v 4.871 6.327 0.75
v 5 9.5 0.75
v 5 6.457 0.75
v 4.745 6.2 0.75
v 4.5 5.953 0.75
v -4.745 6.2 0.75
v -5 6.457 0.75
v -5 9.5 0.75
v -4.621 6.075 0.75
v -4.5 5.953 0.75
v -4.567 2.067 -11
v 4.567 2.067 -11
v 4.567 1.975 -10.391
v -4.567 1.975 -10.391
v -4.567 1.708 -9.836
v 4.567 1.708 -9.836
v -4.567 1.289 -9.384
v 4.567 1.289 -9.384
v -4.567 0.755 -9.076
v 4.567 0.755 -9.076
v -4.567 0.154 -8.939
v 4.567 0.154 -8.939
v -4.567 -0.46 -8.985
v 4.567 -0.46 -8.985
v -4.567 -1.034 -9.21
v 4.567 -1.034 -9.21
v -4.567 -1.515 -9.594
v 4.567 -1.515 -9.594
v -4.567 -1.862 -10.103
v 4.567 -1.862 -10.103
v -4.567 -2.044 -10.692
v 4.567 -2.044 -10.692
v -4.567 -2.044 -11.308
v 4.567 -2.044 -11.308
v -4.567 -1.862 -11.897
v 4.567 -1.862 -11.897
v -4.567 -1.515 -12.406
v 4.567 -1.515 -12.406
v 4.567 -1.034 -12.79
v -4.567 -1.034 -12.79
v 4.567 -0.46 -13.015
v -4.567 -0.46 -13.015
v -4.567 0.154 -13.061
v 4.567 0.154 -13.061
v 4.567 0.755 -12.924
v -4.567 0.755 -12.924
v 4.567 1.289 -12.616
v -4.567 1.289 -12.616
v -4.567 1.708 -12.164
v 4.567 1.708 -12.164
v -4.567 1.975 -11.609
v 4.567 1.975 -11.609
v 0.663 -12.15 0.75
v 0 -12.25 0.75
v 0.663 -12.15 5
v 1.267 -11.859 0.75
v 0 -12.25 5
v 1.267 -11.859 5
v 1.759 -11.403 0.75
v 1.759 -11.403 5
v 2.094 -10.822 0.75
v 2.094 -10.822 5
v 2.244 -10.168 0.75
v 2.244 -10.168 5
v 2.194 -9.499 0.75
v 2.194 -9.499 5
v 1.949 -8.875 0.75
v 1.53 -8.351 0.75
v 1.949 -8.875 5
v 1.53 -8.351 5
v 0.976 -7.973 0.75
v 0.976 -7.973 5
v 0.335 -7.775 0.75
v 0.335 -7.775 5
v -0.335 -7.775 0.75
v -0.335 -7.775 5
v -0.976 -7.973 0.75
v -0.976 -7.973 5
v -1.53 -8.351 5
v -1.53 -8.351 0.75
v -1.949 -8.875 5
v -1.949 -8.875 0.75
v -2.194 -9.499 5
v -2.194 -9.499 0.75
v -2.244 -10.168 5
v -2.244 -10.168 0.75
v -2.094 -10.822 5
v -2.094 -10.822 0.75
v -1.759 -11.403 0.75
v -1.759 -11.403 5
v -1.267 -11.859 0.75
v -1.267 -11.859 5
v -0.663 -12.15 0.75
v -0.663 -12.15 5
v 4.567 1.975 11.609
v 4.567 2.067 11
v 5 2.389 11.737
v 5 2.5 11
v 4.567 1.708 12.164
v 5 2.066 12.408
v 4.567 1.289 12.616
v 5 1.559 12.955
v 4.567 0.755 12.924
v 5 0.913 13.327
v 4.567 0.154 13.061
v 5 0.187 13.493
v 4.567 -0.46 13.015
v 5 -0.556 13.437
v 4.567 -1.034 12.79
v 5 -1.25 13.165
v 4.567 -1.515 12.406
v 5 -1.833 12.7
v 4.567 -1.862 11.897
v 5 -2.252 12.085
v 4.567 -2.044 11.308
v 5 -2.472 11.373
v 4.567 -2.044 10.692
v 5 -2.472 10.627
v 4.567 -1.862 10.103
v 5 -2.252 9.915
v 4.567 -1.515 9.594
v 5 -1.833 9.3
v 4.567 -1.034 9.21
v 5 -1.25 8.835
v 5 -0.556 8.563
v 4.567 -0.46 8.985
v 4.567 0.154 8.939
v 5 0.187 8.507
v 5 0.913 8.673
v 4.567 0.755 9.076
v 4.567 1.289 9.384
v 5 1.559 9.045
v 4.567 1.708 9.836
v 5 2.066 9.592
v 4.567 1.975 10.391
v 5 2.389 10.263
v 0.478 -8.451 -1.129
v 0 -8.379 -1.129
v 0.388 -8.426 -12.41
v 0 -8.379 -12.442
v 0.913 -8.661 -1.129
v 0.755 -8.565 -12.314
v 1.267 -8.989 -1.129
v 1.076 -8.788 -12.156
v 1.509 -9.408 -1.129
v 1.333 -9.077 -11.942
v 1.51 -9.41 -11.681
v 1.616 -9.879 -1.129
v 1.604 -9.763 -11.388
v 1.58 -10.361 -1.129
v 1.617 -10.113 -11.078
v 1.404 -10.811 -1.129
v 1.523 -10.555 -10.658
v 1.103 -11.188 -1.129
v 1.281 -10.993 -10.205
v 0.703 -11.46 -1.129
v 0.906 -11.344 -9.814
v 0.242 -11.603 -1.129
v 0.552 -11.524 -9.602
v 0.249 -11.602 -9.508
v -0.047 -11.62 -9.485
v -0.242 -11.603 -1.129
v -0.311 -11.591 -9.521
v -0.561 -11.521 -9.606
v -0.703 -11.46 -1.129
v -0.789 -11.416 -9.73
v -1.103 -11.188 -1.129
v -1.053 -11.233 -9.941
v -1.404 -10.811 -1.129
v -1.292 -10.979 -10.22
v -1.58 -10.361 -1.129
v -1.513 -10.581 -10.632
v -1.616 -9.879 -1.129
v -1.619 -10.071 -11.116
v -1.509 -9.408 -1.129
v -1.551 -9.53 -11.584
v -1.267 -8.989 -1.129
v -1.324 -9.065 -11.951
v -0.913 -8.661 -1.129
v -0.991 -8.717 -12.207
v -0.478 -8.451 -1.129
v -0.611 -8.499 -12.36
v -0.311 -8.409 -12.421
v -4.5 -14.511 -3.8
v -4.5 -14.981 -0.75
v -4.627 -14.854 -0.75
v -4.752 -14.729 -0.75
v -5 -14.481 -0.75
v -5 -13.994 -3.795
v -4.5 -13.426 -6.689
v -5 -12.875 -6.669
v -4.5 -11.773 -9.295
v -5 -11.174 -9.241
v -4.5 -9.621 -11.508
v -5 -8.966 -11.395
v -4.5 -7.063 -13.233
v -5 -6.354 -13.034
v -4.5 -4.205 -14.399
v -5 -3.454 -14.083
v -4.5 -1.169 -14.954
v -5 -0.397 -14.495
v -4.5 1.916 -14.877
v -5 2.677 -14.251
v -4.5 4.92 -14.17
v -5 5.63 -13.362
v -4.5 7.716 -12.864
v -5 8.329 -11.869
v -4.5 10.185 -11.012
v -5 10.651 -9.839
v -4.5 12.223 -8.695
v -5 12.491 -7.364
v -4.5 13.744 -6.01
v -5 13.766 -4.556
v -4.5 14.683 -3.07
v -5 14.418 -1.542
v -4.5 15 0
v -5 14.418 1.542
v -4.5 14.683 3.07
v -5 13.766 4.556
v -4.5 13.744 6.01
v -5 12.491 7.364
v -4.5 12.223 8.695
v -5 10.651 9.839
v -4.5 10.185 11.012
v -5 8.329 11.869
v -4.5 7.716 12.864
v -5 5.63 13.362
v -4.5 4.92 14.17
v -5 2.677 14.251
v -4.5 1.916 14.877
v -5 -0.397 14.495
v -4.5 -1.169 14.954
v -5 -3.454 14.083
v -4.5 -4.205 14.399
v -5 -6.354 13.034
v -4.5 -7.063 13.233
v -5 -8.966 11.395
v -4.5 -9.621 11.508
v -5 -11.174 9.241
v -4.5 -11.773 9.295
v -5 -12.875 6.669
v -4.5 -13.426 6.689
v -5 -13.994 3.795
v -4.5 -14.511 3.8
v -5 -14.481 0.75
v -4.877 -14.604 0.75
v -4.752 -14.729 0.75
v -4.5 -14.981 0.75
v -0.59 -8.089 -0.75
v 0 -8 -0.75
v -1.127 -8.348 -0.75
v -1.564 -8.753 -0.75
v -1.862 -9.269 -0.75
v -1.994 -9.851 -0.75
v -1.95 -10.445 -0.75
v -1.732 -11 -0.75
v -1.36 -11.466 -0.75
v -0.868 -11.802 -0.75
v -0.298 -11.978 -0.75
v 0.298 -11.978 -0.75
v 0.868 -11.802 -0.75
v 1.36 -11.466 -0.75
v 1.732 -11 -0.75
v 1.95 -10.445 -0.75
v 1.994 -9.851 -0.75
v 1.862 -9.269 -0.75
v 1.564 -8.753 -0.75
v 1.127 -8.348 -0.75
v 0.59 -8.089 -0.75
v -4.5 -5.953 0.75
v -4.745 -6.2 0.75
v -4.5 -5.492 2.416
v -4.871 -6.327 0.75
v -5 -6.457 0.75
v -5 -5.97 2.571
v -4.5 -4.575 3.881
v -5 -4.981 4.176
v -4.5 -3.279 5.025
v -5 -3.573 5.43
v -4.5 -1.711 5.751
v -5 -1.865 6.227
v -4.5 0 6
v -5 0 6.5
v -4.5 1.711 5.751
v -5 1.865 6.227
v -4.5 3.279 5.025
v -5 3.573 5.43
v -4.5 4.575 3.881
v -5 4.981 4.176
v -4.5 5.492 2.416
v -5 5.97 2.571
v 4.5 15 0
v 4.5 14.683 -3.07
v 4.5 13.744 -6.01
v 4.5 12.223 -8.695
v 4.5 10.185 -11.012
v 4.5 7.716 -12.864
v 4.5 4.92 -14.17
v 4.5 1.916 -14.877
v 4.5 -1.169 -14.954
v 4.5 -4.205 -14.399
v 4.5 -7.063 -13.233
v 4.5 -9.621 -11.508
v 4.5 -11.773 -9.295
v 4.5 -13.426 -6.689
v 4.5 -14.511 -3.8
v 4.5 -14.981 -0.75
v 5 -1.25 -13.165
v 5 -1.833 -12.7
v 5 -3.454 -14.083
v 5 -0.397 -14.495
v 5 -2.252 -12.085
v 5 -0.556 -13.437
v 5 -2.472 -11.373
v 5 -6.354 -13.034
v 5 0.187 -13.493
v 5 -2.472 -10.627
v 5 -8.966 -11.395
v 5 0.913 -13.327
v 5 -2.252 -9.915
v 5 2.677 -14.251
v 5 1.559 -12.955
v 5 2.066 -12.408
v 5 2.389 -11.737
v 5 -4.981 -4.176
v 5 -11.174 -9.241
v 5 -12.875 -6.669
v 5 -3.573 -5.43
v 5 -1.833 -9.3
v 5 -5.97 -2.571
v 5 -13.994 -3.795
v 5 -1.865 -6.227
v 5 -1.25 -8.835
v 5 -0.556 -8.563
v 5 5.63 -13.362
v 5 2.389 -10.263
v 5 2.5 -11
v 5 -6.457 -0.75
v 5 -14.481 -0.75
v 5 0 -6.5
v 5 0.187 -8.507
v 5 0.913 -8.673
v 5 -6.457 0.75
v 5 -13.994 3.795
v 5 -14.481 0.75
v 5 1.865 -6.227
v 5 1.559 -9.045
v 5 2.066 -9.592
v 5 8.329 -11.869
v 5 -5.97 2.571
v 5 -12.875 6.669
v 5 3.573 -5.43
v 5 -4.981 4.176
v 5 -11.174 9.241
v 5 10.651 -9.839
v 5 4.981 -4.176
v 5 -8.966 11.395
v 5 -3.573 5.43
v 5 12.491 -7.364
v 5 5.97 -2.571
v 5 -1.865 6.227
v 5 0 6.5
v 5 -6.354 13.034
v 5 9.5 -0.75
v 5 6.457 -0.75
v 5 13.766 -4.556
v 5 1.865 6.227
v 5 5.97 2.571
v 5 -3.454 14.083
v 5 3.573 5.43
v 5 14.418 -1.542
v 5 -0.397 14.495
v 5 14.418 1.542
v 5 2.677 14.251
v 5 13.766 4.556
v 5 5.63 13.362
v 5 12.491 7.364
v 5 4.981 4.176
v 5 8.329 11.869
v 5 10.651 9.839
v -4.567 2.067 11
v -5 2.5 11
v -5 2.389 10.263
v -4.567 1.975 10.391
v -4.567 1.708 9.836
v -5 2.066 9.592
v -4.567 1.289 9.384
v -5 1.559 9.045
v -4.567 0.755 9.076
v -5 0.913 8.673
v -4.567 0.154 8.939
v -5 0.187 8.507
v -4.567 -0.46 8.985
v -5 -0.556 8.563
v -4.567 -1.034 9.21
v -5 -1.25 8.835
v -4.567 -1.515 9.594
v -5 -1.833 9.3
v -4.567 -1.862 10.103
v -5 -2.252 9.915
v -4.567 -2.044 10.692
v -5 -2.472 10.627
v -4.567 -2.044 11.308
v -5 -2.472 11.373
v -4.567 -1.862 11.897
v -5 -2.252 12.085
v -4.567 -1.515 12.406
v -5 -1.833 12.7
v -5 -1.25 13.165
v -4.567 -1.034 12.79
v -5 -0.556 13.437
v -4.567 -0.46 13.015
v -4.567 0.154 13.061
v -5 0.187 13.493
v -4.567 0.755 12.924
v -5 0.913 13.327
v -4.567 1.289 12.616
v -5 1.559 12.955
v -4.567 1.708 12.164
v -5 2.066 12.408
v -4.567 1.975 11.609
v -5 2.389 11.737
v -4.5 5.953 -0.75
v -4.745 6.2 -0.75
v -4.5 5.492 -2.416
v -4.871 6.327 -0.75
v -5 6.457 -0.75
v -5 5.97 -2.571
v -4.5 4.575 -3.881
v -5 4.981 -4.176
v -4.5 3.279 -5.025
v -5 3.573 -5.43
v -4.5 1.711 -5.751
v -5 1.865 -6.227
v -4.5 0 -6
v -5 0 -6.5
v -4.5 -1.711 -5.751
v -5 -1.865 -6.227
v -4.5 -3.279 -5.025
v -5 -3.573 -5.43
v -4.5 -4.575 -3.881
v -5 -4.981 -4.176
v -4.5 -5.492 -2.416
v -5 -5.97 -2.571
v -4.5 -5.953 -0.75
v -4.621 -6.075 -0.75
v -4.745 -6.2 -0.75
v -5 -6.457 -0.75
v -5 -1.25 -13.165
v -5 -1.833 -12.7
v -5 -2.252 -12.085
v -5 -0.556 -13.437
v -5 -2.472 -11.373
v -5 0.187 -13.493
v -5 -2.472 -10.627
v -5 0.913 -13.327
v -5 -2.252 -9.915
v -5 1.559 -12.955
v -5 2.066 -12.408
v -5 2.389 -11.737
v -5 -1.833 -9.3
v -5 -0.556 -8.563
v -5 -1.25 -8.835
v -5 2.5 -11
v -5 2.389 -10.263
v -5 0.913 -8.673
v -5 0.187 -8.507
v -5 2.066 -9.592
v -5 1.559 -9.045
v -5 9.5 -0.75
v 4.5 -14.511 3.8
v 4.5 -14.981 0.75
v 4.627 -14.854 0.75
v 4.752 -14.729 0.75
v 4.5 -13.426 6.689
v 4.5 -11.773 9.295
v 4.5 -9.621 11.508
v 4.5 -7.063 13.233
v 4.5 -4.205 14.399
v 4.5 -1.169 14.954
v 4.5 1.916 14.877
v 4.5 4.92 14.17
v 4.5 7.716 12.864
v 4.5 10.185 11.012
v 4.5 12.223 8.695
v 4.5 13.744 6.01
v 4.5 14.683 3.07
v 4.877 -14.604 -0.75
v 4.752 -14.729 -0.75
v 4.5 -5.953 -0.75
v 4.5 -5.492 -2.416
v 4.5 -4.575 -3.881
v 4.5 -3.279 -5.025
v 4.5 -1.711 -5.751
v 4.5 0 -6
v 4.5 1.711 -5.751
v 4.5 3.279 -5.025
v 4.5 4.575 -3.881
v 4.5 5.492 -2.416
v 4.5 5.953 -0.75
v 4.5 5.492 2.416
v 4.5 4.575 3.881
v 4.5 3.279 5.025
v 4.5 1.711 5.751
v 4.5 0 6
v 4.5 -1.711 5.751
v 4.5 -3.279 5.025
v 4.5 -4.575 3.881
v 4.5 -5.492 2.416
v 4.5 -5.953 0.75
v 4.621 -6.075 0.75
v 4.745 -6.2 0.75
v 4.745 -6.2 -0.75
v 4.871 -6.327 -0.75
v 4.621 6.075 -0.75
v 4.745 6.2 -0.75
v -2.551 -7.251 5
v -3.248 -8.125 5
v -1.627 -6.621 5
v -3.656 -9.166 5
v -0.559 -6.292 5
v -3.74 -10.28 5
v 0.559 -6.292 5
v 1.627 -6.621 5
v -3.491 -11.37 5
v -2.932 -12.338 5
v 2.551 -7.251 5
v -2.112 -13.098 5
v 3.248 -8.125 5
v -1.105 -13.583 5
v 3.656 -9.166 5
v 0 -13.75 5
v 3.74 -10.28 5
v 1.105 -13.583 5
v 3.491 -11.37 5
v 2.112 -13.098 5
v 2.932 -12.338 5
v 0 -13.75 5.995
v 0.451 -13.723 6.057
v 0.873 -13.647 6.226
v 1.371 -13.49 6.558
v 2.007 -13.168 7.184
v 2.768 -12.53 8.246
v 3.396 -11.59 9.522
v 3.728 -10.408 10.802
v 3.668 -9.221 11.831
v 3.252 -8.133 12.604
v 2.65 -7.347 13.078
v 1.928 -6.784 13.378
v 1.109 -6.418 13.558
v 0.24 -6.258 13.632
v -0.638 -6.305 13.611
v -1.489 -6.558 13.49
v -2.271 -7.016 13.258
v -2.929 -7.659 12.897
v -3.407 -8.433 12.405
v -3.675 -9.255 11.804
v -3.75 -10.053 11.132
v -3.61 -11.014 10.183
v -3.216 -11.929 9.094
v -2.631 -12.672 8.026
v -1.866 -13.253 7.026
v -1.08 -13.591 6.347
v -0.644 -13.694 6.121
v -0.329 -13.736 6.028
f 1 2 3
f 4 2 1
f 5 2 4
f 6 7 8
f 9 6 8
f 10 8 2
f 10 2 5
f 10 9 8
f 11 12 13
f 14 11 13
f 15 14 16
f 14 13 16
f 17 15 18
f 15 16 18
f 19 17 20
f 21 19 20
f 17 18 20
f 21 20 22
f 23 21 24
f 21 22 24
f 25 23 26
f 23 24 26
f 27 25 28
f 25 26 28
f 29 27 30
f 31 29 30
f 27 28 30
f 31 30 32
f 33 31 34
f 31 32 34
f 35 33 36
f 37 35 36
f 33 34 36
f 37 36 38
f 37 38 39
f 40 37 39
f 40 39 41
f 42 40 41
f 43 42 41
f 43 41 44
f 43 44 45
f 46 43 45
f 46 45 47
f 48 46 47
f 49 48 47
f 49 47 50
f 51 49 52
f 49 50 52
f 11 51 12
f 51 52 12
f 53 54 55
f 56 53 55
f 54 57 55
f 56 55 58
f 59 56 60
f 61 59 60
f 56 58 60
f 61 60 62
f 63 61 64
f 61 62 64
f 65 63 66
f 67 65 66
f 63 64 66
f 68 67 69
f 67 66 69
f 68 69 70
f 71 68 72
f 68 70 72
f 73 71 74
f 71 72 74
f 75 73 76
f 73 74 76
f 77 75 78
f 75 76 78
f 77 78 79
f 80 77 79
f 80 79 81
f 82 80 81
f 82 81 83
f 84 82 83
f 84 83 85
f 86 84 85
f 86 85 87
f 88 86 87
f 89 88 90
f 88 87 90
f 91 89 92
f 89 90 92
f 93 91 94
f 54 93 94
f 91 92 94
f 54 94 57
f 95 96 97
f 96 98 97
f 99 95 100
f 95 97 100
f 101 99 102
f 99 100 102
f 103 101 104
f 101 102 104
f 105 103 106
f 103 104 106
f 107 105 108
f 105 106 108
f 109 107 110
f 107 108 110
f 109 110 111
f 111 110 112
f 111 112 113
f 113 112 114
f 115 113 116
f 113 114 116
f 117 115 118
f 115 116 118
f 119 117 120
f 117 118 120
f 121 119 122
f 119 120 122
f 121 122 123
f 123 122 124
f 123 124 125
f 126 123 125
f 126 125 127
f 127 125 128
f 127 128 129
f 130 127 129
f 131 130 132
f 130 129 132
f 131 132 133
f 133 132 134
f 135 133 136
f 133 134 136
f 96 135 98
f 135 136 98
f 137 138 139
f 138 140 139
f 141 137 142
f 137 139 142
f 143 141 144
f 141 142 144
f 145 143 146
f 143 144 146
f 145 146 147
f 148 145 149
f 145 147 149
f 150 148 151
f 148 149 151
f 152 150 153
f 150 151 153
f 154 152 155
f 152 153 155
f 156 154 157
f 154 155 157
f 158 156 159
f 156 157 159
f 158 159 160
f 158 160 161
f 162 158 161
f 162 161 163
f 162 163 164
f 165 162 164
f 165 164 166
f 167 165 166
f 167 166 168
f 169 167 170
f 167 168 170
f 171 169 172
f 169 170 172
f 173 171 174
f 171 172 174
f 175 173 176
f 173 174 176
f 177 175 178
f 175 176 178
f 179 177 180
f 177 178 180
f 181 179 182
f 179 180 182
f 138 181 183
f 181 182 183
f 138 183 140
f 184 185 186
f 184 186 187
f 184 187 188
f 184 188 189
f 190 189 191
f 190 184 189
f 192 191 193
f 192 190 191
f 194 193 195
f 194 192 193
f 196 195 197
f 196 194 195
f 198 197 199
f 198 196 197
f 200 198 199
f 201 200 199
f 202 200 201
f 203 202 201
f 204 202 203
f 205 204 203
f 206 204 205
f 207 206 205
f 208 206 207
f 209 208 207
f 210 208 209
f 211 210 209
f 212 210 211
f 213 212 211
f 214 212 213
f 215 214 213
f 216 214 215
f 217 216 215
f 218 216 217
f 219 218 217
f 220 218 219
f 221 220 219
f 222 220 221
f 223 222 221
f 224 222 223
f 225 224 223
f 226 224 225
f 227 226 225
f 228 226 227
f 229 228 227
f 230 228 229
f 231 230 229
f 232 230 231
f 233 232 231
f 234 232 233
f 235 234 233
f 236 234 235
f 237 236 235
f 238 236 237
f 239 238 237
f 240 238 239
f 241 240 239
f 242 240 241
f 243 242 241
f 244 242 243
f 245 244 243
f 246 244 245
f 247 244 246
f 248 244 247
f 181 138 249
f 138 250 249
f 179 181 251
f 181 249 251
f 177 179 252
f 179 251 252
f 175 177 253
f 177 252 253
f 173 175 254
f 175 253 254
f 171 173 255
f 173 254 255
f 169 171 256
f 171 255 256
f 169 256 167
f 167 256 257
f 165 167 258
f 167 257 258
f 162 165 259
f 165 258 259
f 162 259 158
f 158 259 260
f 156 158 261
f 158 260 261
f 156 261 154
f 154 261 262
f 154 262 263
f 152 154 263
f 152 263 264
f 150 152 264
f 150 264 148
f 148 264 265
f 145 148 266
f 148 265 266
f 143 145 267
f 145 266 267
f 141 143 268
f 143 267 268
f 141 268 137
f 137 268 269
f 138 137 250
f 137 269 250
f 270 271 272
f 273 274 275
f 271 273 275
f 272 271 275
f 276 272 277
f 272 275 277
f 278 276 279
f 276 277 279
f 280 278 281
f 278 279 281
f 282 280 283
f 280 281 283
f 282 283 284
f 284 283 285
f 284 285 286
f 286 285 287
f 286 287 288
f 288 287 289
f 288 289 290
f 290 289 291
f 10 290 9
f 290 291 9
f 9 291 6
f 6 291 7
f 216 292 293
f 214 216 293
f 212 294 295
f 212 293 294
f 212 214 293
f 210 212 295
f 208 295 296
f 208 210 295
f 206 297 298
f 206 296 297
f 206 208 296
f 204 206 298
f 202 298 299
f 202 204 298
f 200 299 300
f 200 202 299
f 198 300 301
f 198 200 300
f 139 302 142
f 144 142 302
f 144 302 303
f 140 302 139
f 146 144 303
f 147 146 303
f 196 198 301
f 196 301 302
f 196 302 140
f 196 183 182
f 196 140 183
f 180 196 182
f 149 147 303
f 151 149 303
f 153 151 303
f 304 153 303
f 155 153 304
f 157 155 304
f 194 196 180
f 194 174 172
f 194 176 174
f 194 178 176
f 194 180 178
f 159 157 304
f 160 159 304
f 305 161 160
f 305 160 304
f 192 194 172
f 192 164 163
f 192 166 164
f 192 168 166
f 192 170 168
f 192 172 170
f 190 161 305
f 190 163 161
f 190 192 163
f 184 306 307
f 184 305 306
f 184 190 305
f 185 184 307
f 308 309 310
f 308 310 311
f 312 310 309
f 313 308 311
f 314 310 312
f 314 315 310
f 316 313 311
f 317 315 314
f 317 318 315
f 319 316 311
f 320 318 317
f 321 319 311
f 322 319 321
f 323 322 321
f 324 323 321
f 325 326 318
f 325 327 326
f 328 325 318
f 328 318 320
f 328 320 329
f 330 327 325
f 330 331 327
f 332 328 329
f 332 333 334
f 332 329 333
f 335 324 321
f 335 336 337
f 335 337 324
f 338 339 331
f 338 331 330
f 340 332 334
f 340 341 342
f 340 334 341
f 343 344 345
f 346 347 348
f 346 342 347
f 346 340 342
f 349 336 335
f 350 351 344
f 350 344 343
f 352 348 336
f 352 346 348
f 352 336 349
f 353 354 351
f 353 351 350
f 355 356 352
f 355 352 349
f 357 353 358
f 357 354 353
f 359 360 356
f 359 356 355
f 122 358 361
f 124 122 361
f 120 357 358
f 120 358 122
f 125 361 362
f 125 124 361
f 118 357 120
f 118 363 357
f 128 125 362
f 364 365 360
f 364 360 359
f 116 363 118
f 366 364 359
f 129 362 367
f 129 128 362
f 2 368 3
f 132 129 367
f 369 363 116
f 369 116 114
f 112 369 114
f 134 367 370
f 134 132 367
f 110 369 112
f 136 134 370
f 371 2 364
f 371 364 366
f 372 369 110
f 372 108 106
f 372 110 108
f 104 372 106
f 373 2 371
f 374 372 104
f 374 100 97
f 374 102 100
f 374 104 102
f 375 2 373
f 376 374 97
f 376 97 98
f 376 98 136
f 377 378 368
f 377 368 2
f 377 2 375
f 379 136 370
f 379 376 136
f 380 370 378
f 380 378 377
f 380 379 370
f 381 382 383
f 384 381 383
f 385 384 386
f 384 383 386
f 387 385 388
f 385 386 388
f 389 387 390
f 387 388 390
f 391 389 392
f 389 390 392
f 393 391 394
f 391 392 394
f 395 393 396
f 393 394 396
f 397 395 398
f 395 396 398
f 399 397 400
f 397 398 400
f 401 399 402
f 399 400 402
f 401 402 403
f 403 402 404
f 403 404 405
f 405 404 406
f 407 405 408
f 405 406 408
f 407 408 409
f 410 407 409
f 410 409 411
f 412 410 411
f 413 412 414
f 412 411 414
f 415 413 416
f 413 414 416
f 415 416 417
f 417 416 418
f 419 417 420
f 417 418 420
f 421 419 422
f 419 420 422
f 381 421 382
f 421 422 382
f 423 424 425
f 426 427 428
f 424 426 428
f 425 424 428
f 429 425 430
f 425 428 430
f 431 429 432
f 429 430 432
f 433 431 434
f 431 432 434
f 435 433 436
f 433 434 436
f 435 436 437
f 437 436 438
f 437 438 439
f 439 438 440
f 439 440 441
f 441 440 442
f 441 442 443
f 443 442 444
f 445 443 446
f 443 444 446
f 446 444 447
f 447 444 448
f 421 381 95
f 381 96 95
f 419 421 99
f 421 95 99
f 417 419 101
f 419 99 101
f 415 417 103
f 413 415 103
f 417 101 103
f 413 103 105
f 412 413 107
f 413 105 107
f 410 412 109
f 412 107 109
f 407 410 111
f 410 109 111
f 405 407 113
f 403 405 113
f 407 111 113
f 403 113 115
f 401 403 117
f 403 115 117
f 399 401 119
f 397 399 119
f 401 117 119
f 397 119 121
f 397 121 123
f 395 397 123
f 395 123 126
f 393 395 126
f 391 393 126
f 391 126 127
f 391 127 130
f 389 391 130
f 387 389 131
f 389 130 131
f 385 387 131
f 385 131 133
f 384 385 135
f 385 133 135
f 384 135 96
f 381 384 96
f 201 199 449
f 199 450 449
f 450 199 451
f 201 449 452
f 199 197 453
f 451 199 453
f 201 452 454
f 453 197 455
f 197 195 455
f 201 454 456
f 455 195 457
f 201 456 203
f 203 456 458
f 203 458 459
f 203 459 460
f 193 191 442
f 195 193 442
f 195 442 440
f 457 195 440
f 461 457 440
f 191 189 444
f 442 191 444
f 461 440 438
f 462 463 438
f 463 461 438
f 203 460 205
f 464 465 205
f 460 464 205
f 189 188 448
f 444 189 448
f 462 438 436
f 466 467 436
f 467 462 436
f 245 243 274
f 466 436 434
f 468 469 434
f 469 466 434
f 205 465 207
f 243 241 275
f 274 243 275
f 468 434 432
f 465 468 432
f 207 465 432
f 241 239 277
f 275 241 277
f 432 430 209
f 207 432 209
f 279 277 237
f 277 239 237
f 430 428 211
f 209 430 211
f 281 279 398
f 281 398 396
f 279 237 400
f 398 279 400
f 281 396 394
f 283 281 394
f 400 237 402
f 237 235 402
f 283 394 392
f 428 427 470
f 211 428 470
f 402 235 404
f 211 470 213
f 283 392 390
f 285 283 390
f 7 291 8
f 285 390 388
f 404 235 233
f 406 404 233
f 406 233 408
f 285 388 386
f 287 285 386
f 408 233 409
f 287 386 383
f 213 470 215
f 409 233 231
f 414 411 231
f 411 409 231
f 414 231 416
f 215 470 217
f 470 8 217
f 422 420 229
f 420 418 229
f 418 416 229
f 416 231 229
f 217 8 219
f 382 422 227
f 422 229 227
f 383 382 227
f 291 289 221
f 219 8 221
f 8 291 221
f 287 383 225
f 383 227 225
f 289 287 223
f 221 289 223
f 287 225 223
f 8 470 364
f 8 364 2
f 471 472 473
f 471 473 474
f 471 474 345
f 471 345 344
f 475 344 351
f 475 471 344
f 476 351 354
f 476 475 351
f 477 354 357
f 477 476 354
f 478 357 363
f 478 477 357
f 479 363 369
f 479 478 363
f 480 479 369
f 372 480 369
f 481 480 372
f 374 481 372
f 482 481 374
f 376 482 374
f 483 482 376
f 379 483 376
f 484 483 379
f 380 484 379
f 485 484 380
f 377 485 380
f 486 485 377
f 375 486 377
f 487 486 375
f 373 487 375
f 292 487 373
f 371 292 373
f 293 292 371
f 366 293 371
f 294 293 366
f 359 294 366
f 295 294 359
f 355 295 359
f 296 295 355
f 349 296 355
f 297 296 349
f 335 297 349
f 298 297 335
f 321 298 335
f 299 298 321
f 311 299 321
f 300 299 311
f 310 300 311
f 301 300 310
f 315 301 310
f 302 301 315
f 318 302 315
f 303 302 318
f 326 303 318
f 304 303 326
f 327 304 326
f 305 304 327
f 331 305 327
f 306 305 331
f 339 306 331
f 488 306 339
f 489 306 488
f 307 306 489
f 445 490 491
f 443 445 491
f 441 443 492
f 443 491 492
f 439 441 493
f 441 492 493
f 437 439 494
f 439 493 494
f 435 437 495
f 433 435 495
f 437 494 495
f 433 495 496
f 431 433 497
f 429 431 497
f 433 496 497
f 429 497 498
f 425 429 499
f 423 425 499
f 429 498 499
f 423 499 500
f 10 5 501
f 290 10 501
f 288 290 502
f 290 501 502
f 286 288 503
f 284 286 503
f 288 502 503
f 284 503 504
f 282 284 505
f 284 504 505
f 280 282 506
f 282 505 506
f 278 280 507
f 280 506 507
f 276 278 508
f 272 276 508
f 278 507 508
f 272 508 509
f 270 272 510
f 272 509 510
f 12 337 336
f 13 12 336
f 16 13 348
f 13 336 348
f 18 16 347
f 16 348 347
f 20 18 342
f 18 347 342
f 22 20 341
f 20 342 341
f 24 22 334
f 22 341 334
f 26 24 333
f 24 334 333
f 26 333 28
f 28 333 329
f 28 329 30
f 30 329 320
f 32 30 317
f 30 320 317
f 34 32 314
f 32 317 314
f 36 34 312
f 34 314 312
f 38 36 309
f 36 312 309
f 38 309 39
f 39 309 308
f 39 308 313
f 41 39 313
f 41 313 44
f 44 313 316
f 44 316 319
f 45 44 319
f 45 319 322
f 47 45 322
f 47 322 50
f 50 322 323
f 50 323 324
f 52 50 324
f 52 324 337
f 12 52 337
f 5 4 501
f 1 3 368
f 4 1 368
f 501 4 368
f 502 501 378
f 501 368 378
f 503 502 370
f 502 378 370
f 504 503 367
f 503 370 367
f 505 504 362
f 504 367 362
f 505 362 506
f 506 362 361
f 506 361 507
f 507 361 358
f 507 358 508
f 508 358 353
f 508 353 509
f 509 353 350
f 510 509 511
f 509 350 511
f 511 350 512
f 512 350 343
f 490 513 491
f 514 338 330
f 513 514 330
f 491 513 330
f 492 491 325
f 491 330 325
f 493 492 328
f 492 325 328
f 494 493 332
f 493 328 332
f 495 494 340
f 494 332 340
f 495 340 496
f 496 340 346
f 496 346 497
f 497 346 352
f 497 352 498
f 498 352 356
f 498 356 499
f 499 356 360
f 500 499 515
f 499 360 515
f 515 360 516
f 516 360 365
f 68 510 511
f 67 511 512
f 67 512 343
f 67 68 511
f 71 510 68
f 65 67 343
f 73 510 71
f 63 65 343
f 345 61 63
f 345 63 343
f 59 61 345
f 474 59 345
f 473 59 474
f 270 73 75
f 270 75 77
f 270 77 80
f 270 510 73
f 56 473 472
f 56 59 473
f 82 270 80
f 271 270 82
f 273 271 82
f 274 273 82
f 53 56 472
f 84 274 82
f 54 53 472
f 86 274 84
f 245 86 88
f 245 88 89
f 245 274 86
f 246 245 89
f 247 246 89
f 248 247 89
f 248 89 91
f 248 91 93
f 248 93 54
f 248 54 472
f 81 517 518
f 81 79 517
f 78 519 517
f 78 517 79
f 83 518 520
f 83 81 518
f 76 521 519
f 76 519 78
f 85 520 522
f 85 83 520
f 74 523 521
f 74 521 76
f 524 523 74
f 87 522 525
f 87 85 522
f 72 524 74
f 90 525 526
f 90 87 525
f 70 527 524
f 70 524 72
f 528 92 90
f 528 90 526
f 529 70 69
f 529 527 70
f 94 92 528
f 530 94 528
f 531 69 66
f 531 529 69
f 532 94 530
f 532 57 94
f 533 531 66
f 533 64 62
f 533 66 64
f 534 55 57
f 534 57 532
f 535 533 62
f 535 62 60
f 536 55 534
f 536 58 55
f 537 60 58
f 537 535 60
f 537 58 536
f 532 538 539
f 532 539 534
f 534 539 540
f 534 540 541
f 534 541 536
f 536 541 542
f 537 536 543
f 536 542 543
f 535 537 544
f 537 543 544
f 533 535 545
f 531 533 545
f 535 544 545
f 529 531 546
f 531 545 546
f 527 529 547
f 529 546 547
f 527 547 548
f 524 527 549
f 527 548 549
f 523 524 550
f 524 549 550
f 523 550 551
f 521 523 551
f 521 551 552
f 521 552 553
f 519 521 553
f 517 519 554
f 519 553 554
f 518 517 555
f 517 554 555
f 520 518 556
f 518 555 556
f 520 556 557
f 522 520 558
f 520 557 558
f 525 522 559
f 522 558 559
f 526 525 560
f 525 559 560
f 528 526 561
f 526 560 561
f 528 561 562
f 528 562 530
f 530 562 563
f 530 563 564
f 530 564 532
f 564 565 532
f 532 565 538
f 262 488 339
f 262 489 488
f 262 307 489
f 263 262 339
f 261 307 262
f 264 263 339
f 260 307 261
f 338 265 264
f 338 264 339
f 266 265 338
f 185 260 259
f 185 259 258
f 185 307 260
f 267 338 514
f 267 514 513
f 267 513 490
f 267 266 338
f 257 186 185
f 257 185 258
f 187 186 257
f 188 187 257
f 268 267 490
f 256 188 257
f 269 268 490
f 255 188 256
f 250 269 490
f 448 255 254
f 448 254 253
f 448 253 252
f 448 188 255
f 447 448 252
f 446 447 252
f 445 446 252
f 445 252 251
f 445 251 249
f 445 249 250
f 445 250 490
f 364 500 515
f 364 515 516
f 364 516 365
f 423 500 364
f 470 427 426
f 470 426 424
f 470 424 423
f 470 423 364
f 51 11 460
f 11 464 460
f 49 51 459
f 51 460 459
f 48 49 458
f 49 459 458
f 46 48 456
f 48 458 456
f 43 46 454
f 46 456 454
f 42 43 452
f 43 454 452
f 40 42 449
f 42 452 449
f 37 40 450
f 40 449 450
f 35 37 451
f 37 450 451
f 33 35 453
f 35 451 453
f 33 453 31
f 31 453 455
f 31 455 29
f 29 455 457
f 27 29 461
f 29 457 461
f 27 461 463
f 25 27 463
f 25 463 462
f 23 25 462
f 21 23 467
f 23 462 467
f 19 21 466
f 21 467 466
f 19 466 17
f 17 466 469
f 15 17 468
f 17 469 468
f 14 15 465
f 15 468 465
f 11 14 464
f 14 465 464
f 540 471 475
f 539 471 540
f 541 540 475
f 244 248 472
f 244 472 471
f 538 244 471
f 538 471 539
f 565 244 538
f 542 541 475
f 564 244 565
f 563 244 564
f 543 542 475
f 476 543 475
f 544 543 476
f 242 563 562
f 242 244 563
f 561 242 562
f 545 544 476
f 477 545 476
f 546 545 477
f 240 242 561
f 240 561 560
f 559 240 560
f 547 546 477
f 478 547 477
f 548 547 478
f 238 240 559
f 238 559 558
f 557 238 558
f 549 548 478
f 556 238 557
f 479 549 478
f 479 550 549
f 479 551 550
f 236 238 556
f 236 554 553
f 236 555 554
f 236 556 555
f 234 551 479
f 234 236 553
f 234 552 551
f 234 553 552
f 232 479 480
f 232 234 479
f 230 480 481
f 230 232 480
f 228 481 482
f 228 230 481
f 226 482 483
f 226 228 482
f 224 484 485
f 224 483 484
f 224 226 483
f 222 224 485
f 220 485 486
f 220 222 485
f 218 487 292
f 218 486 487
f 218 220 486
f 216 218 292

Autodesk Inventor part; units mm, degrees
sketch "Sketch_1" plane through (0, 0, 0) normal (0, 0, 1) x (1, 0, 0)
  line L0 (5, 0) -> (-5, 0)
  line L1 (-5, 14.5) -> (-5, 6.5)
  line L2 (-5, 6.5) -> (-4.5, 6)
  line L3 (-4.5, 6) -> (4.5, 6)
  line L4 (4.5, 6) -> (5, 6.5)
  line L5 (5, 6.5) -> (5, 14.5)
  line L6 (5, 14.5) -> (4.5, 15)
  line L7 (4.5, 15) -> (-4.5, 15)
  line L8 (-4.5, 15) -> (-5, 14.5)
revolve "Revolution1" add sketch "Sketch_1" angle 360 about axis through (5, 0, 0) along (1, 0, 0)
sketch "Sketch_2" plane through (0, 0, 0) normal (1, 0, 0) x (0, 1, 0)
  line L0 (-15, 0.75) -> (-15, -0.75)
  line L1 (-15, -0.75) -> (9.5, -0.75)
  line L2 (9.5, -0.75) -> (9.5, 0.75)
  line L3 (9.5, 0.75) -> (-15, 0.75)
extrude "Extrusion1" cut sketch "Sketch_2" along normal mid plane 10
sketch "Sketch_3" plane through (0, 0, 0) normal (1, 0, 0) x (0, 1, 0)
  line L0 (-10, 15) -> (-10, 0)
  line L1 (-10, 0) -> (-12.25, 0)
  line L2 (-12.25, 0) -> (-12.25, 5)
  line L3 (-12.25, 5) -> (-13.75, 5)
  line L4 (-13.75, 5) -> (-13.75, 15)
  line L5 (-13.75, 15) -> (-10, 15)
  line L6 (-10, 15) -> (-10, 0)
revolve "Revolution2" cut sketch "Sketch_3" angle 360 about axis through (0, -10, 15) along (0, 0, 1)
sketch "Sketch_4" plane through (0, 0, 0) normal (1, 0, 0) x (0, 1, 0)
  line L0 (-10, -15.75) -> (-10, -0.75)
  line L1 (-10, -0.75) -> (-8, -0.75)
  line L2 (-8, -0.75) -> (-8.379, -1.129)
  line L3 (-8.379, -1.129) -> (-8.379, -15.75)
  line L4 (-8.379, -15.75) -> (-10, -15.75)
  line L5 (-10, -15.75) -> (-10, -0.75)
revolve "Revolution3" cut sketch "Sketch_4" angle 360 about axis through (0, -10, -15.75) along (0, 0, -1)
thread "Thread1" size "M4x0.7" class "6H" standard "ISO Metric profile" length 11.5596
sketch "Sketch_7" plane through (0, 0, -11) normal (0, 0, 1) x (1, 0, 0)
  line L0 (5, 0) -> (-5, 0)
  line L1 (-5, 0) -> (-5, 2.5)
  line L2 (-5, 2.5) -> (-4.567, 2.067)
  line L3 (-4.567, 2.067) -> (4.567, 2.067)
  line L4 (4.567, 2.067) -> (5, 2.5)
  line L5 (5, 2.5) -> (5, 0)
  line L6 (5, 0) -> (-5, 0)
revolve "Revolution4" cut sketch "Sketch_7" angle 360 about axis through (5, 0, -11) along (1, 0, 0)
thread "Thread2" size "M5x0.8" class "6H" standard "ISO Metric profile" full length
sketch "Sketch_8" plane through (0, 0, 11) normal (0, 0, 1) x (1, 0, 0)
  line L0 (5, 0) -> (-5, 0)
  line L1 (-5, 0) -> (-5, 2.5)
  line L2 (-5, 2.5) -> (-4.567, 2.067)
  line L3 (-4.567, 2.067) -> (4.567, 2.067)
  line L4 (4.567, 2.067) -> (5, 2.5)
  line L5 (5, 2.5) -> (5, 0)
  line L6 (5, 0) -> (-5, 0)
revolve "Revolution5" cut sketch "Sketch_8" angle 360 about axis through (5, 0, 11) along (1, 0, 0)
thread "Thread3" size "M5x0.8" class "6H" standard "ISO Metric profile" full length
ref_plane "body_screw_XY" through (0, -10, 5) normal (0, 0, 1) x (1, 0, 0)
ref_plane "body_screw_YZ" through (0, -10, 5) normal (1, 0, 0) x (0, 1, 0)
ref_plane "body_screw_ZX" through (0, -10, 5) normal (0, 1, 0) x (0, 0, 1)
properties part number "SCSW12-10b"
